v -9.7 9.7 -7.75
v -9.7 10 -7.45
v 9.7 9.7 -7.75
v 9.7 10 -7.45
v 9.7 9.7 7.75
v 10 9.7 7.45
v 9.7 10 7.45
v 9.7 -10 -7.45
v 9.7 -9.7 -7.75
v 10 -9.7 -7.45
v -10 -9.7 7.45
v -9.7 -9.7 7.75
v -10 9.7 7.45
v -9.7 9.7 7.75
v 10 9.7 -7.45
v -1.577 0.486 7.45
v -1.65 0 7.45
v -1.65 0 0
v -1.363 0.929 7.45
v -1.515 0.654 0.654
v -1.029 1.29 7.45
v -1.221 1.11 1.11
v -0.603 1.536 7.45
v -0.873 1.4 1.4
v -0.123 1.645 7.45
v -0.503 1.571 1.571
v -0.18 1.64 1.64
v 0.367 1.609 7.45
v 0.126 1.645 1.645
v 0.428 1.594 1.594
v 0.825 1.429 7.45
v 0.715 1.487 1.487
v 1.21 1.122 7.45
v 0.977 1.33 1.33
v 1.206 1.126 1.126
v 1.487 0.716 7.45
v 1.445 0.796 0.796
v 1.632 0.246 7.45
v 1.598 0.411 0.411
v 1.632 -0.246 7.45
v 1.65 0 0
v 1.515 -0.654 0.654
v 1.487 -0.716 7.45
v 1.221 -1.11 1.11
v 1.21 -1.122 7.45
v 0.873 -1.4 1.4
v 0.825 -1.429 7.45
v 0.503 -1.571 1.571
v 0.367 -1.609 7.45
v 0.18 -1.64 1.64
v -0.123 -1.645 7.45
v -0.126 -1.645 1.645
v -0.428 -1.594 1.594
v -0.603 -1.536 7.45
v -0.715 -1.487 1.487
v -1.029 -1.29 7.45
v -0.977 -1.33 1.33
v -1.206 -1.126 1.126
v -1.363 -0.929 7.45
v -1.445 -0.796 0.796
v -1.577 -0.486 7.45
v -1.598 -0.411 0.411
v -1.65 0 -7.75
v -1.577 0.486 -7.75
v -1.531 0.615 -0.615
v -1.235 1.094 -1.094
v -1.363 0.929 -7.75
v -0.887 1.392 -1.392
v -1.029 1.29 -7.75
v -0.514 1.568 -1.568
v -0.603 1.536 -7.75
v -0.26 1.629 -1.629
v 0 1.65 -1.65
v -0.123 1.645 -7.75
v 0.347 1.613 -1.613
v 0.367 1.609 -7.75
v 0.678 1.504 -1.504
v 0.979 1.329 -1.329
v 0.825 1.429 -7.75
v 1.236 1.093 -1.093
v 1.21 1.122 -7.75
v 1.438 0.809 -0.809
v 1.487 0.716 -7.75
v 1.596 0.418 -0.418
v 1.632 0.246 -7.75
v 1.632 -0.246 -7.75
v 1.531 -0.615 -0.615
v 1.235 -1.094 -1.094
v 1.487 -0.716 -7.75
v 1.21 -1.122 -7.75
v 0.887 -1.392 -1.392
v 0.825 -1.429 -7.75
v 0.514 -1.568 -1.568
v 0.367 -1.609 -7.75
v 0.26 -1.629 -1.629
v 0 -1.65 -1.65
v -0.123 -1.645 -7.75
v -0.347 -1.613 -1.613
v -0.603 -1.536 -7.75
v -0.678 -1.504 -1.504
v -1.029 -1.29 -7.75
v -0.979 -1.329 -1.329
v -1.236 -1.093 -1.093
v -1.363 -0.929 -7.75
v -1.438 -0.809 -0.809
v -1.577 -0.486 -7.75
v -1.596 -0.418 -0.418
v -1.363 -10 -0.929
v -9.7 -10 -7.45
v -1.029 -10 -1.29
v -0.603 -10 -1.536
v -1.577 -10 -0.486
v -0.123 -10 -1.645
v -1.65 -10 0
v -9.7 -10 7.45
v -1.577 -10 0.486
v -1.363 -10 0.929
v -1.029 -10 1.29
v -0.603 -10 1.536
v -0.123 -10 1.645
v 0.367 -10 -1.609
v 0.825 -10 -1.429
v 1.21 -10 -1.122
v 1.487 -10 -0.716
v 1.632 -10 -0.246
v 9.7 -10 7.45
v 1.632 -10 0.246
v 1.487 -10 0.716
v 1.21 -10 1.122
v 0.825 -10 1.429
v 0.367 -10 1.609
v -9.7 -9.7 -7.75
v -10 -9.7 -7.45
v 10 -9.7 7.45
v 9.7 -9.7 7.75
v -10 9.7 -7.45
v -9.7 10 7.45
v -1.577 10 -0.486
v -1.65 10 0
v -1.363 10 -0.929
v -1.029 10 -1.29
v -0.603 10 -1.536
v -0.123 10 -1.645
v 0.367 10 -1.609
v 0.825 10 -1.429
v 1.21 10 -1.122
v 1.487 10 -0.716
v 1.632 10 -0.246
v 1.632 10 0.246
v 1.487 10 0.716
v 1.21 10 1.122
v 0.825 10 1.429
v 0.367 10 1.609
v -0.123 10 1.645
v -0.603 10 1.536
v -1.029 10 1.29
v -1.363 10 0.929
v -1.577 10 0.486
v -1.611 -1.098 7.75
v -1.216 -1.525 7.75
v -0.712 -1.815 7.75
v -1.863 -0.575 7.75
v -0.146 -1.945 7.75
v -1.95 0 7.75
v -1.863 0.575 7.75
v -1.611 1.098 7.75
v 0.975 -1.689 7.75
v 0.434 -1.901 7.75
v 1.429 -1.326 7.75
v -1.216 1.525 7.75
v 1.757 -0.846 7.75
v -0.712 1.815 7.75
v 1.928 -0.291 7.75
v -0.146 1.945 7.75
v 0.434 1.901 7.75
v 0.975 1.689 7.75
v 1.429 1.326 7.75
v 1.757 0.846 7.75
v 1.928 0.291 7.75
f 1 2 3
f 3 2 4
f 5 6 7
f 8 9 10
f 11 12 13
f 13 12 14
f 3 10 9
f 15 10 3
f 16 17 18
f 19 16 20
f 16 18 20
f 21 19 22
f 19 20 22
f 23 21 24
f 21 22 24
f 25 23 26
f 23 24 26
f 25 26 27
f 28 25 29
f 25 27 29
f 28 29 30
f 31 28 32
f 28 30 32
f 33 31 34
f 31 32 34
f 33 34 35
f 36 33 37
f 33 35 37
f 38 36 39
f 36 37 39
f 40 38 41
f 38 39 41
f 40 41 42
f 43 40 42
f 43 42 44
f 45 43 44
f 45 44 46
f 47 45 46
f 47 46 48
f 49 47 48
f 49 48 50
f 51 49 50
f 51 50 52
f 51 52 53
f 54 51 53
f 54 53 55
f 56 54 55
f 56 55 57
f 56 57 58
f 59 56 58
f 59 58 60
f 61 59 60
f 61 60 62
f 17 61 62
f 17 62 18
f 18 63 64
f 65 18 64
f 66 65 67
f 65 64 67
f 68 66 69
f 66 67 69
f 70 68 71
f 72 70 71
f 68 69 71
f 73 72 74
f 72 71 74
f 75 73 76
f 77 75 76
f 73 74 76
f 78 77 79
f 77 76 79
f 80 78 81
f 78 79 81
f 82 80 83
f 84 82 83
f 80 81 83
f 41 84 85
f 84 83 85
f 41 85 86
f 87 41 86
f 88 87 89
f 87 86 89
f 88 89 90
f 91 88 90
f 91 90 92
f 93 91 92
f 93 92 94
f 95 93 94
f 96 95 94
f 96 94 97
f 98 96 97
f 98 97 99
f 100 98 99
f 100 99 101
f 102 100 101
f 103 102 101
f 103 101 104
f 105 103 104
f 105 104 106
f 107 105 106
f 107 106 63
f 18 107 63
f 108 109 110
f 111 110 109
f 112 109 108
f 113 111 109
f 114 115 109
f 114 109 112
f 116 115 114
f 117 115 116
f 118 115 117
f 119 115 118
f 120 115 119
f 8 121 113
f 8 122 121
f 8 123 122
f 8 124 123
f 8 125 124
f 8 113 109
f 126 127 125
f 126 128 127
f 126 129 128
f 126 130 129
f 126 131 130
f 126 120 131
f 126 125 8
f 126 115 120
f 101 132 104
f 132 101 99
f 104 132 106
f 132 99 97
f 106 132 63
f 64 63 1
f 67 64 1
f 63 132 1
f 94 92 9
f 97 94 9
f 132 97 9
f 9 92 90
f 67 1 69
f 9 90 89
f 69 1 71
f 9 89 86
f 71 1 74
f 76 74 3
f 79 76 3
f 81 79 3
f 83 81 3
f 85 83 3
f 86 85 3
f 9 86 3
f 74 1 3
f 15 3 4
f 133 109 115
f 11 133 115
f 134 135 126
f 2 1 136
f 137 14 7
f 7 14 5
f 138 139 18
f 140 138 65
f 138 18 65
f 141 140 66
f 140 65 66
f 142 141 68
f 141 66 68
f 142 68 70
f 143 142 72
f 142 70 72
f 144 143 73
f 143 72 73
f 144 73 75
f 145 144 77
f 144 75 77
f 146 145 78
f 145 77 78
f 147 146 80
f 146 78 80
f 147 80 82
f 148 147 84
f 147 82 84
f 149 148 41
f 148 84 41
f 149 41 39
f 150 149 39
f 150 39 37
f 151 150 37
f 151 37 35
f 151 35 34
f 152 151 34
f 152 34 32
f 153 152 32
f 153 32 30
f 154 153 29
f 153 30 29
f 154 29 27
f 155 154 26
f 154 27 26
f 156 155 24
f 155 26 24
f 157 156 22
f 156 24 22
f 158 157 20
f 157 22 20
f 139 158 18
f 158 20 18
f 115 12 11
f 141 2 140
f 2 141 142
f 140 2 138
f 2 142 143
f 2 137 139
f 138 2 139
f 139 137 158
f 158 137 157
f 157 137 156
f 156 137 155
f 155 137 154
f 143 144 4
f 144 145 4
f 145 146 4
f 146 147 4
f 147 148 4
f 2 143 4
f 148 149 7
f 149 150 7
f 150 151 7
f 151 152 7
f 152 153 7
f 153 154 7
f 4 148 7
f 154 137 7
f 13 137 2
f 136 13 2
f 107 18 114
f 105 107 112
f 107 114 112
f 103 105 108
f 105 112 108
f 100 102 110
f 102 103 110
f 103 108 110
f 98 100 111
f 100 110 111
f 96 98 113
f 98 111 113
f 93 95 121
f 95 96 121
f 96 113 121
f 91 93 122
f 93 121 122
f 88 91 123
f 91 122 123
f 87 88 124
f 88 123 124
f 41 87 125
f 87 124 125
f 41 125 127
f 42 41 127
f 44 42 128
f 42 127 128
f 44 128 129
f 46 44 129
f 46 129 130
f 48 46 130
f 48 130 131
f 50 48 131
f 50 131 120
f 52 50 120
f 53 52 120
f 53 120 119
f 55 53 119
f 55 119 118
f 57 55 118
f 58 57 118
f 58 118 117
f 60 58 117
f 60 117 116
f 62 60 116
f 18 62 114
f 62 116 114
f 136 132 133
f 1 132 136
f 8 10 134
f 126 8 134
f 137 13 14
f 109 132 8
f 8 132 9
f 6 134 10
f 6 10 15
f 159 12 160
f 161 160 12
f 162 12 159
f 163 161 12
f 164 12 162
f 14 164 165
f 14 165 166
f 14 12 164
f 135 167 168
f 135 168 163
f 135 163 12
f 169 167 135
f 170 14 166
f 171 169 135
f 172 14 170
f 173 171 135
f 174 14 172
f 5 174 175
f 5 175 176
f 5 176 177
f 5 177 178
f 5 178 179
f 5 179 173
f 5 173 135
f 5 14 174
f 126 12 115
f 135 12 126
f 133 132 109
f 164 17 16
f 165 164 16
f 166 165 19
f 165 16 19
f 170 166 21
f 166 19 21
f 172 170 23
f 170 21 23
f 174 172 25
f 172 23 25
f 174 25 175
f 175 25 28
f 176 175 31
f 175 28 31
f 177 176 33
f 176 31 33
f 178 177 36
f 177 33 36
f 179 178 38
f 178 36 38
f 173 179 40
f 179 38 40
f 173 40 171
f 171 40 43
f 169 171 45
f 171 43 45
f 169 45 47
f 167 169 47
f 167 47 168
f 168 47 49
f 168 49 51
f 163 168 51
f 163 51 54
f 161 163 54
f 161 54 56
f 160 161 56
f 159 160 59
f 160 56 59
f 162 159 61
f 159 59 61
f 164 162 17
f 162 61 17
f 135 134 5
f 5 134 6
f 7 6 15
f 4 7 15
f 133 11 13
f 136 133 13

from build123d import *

# Parameters (mm, degrees)
SKETCH_1_W         = 20
SKETCH_1_H         = 20
EXTRUDE_1_DEPTH    = 7.75
HOLE_WIZARD_M4_1_D = 3.3
HOLE_WIZARD_M4_2_D = 3.3
CHAMFER_1_SIZE     = 0.3


with BuildPart() as part:
    # 草图1 → 凸台-拉伸1 (new body, symmetric)
    with BuildSketch(Plane.XY):
        Rectangle(SKETCH_1_W, SKETCH_1_H)
    extrude(amount=EXTRUDE_1_DEPTH, both=True)

    # M4 螺纹孔1 (through all)
    with Locations(Plane.XY.offset(7.75)):
        with Locations((0, 0)):
            Hole(HOLE_WIZARD_M4_1_D / 2)

    # M4 螺纹孔2 (through all)
    with Locations(Plane(origin=(0, 10, 0), x_dir=(1, 0, 0), z_dir=(0, 1, 0))):
        with Locations((0, 0)):
            Hole(HOLE_WIZARD_M4_2_D / 2)

    # 倒角1
    chamfer_1_edges = [part.edges().sort_by_distance(p)[0] for p in [
        (-10, 0, 7.75),
        (1.65, 0, 7.75),
        (0, -10, 7.75),
        (10, 0, 7.75),
        (0, -10, -7.75),
        (-10, 0, -7.75),
        (0, 10, -7.75),
        (10, 0, -7.75),
        (10, -10, 0),
        (-10, -10, 0),
        (-10, 10, 0),
        (10, 10, 0),
        (0, 10, 7.75),
    ]]
    chamfer(chamfer_1_edges, length=CHAMFER_1_SIZE)


solid = part.part
